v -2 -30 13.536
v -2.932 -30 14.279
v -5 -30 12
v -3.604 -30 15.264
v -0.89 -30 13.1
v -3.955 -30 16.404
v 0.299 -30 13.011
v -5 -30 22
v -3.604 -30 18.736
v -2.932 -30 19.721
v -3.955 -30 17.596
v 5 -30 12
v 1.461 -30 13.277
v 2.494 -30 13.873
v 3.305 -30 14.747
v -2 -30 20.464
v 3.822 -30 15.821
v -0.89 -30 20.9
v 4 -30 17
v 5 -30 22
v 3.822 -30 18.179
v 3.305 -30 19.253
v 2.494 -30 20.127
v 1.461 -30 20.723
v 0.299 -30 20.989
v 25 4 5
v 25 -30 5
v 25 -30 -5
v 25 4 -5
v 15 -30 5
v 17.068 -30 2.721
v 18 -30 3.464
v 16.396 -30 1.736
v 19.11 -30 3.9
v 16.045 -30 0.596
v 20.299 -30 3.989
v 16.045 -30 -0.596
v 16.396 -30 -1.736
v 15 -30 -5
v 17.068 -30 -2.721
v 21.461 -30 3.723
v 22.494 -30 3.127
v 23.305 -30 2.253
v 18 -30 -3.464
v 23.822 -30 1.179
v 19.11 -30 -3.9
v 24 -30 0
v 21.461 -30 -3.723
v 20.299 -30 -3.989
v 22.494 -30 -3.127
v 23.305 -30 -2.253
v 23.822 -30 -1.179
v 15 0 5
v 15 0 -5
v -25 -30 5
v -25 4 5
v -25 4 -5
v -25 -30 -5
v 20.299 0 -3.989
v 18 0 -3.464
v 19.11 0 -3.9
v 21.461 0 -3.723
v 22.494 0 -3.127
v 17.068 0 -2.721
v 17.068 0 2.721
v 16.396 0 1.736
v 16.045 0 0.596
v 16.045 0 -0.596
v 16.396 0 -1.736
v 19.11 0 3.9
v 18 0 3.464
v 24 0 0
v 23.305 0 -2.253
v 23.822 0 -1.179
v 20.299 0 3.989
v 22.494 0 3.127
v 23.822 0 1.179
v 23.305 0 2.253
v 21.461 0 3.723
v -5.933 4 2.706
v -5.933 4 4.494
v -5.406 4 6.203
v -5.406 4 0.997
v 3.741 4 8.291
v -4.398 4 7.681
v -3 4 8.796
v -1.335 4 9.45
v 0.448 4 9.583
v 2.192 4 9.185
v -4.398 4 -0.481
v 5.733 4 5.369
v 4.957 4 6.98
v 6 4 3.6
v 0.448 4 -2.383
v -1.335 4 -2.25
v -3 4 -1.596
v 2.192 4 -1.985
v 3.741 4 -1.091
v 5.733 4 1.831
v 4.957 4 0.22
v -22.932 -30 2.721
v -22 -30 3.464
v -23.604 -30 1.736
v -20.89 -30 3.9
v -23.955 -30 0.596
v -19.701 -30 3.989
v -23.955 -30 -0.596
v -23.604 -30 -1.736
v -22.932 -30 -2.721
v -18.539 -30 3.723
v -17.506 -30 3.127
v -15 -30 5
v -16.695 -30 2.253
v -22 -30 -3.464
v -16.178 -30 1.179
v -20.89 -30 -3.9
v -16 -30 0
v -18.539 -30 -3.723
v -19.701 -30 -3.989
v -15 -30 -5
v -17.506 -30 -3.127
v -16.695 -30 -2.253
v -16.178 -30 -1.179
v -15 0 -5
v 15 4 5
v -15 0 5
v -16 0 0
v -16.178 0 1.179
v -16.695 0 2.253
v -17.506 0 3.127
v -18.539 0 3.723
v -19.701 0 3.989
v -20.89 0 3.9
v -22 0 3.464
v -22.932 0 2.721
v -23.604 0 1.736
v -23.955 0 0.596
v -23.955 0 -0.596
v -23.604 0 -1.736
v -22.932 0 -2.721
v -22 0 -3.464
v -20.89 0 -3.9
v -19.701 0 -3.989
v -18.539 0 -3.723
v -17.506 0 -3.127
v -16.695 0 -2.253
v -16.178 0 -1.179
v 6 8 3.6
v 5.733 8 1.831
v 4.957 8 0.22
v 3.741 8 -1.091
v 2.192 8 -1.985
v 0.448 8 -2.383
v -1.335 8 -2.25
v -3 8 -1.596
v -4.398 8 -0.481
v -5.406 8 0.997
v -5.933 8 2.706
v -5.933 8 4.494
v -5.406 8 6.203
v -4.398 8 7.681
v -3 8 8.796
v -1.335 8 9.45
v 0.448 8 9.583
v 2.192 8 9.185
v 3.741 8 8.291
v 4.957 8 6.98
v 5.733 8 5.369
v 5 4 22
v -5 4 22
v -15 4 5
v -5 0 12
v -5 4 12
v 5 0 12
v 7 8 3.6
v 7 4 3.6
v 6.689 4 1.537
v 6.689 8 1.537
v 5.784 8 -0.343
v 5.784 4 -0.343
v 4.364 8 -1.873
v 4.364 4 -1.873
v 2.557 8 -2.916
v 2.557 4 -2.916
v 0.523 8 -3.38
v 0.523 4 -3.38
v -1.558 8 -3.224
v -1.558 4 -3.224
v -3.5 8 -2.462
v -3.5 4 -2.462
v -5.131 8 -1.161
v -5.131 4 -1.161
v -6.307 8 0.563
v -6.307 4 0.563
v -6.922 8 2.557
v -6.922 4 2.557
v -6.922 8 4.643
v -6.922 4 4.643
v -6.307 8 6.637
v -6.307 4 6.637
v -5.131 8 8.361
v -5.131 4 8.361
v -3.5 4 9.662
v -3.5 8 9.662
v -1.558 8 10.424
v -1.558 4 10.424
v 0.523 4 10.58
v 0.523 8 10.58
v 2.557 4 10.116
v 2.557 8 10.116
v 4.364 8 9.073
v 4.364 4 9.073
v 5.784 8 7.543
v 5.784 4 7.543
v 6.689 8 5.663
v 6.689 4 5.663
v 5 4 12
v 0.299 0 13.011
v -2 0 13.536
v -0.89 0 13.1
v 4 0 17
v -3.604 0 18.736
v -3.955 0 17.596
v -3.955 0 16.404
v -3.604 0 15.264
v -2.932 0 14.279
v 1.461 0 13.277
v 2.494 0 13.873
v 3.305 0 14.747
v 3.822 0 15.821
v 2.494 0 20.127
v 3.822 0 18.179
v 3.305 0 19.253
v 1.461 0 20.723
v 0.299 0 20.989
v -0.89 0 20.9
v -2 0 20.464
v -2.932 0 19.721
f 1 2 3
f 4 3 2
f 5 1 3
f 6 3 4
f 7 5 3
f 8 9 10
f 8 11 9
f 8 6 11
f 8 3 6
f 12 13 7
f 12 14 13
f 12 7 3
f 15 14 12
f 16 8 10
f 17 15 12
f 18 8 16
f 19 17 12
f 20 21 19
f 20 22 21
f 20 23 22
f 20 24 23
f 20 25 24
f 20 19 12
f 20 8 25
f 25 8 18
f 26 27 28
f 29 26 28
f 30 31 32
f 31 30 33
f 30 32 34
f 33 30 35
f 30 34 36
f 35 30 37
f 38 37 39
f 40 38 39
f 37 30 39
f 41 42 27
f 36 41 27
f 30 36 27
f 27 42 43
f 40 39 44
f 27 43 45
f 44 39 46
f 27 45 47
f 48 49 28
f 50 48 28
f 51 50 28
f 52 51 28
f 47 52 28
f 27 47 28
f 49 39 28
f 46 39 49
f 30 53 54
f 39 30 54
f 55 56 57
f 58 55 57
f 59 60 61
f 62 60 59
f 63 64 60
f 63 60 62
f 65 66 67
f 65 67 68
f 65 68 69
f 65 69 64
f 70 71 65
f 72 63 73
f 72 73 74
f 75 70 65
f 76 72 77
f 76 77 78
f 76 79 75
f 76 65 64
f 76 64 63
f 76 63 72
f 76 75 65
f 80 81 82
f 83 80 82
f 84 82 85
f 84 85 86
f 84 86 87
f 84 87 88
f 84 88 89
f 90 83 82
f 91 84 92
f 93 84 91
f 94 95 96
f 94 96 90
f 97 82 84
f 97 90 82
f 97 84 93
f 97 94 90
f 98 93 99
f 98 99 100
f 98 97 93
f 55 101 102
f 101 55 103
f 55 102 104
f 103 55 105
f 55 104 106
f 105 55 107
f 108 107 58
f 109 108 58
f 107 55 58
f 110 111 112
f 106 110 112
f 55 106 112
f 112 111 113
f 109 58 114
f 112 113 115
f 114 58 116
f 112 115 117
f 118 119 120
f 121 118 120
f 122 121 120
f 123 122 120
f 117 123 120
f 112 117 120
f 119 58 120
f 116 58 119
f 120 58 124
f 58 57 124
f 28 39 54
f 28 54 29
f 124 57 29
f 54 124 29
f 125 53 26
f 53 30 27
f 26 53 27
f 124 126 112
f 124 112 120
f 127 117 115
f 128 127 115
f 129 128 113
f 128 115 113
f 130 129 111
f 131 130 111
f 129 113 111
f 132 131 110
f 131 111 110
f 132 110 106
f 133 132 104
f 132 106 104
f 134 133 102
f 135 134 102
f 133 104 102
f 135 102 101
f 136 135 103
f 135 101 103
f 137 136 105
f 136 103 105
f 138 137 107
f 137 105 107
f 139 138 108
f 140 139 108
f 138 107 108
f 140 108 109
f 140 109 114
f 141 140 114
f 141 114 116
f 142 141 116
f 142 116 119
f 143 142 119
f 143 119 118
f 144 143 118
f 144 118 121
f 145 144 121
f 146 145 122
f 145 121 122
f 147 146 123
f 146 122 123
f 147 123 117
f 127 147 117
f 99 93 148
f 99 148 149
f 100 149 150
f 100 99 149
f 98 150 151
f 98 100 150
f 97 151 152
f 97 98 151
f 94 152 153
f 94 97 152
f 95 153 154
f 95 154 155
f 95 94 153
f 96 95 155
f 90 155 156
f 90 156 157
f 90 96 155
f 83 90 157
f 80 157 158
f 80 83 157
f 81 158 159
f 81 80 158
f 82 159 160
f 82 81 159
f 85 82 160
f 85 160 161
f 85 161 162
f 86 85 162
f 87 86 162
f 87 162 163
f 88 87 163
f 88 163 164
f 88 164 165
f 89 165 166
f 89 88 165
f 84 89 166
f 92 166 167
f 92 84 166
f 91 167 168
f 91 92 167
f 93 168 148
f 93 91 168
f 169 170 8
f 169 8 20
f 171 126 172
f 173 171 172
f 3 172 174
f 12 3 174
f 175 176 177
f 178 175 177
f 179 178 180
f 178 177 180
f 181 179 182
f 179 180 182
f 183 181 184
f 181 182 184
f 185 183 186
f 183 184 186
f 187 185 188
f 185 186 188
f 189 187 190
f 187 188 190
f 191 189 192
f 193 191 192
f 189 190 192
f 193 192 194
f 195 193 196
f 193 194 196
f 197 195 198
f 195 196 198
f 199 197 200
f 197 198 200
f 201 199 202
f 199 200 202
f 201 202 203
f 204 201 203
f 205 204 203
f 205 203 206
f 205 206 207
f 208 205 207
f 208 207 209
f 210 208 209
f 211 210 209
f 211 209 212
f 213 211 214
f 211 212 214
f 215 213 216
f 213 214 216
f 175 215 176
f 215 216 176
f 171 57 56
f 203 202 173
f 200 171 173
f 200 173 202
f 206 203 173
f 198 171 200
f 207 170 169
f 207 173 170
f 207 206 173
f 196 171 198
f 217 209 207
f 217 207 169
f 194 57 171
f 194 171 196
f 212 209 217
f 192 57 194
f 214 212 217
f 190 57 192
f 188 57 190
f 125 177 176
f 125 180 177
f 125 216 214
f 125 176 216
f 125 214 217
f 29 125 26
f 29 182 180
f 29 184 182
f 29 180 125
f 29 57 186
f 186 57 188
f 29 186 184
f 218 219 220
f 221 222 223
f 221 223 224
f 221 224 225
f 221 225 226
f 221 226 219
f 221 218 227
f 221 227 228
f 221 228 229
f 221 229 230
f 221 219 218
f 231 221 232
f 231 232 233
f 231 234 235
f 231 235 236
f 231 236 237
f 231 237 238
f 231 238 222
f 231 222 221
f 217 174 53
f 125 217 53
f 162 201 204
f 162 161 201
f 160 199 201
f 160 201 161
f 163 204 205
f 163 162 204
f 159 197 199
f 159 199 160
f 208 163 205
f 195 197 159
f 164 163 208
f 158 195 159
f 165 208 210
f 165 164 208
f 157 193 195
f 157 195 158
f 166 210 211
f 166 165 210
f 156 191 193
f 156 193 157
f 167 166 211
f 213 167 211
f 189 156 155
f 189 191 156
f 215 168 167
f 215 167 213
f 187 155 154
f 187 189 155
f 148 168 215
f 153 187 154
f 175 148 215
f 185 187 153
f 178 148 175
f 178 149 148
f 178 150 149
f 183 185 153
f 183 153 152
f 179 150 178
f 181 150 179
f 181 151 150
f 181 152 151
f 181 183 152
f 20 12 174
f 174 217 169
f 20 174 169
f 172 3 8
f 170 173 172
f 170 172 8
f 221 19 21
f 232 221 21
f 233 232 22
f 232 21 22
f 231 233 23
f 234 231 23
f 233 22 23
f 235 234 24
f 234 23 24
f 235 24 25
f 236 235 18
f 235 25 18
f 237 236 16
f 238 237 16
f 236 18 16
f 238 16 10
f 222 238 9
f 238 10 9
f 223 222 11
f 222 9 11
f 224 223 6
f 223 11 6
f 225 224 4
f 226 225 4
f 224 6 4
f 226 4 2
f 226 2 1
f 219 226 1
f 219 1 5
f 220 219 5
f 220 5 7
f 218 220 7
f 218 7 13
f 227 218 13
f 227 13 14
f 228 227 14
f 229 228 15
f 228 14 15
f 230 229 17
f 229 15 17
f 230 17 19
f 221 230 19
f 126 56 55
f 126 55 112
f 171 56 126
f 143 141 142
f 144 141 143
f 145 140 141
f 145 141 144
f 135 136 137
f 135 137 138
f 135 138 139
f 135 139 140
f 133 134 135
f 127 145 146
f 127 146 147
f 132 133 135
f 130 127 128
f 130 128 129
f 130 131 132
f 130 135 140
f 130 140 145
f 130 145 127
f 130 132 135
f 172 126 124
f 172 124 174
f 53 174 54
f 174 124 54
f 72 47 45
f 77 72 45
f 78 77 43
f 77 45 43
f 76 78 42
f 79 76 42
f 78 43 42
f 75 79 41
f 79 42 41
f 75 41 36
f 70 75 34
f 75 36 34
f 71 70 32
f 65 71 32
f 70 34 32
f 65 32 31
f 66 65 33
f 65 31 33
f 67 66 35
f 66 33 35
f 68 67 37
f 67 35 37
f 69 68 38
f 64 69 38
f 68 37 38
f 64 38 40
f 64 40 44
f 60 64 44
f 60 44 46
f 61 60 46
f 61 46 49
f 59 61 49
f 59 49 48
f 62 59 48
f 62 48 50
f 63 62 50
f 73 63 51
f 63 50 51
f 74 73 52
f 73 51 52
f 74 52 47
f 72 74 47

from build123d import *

# Parameters (mm, degrees)
EXTRUDE_1_DEPTH     = 4
SKETCH_1_W          = 10
SKETCH_1_H          = 10
EXTRUDE_2_DEPTH     = 30
SKETCH_6_W          = 10
SKETCH_6_H          = 10
EXTRUDE_4_DEPTH     = 30
SKETCH_9_R          = 7
SKETCH_9_R_2        = 6
EXTRUDE_5_DEPTH     = 4
SKETCH_11_R         = 4
CUT_EXTRUDE_1_DEPTH = 30


with BuildPart() as part:
    # 草图2 → 凸台-拉伸1 (new body)
    with BuildSketch(Plane(origin=(0, 0, 0), x_dir=(1, 0, 0), z_dir=(0, 1, 0))):
        Polygon((-5, -22), (5, -22), (5, -12), (15, -5), (25, -5), (25, 5), (-25, 5), (-25, -5), (-15, -5), (-5, -12), align=None)
    extrude(amount=EXTRUDE_1_DEPTH)

    # 草图1 → 凸台-拉伸2 (add)
    with BuildSketch(Plane(origin=(0, 0, 0), x_dir=(1, 0, 0), z_dir=(0, 1, 0))):
        with Locations((-20, 0)):
            Rectangle(SKETCH_1_W, SKETCH_1_H)
        with Locations((20, 0)):
            Rectangle(SKETCH_1_W, SKETCH_1_H)
    extrude(amount=-EXTRUDE_2_DEPTH)

    # 草图6 → 凸台-拉伸4 (add)
    with BuildSketch(Plane.XZ):
        with Locations((0, 17)):
            Rectangle(SKETCH_6_W, SKETCH_6_H)
    extrude(amount=EXTRUDE_4_DEPTH)

    # 草图9 → 凸台-拉伸5 (add)
    with BuildSketch(Plane(origin=(0, 4, 0), x_dir=(1, 0, 0), z_dir=(0, 1, 0))):
        with Locations((0, -3.6)):
            Circle(SKETCH_9_R)
        with Locations((0, -3.6)):
            Circle(SKETCH_9_R_2, mode=Mode.SUBTRACT)
    extrude(amount=EXTRUDE_5_DEPTH)

    # 草图11 → 切除-拉伸1 (cut)
    with BuildSketch(Plane.XZ.offset(30)):
        with Locations((0, 17)):
            Circle(SKETCH_11_R)
        with Locations((20, 0)):
            Circle(SKETCH_11_R)
        with Locations((-20, 0)):
            Circle(SKETCH_11_R)
    extrude(amount=-CUT_EXTRUDE_1_DEPTH, mode=Mode.SUBTRACT)


solid = part.part
